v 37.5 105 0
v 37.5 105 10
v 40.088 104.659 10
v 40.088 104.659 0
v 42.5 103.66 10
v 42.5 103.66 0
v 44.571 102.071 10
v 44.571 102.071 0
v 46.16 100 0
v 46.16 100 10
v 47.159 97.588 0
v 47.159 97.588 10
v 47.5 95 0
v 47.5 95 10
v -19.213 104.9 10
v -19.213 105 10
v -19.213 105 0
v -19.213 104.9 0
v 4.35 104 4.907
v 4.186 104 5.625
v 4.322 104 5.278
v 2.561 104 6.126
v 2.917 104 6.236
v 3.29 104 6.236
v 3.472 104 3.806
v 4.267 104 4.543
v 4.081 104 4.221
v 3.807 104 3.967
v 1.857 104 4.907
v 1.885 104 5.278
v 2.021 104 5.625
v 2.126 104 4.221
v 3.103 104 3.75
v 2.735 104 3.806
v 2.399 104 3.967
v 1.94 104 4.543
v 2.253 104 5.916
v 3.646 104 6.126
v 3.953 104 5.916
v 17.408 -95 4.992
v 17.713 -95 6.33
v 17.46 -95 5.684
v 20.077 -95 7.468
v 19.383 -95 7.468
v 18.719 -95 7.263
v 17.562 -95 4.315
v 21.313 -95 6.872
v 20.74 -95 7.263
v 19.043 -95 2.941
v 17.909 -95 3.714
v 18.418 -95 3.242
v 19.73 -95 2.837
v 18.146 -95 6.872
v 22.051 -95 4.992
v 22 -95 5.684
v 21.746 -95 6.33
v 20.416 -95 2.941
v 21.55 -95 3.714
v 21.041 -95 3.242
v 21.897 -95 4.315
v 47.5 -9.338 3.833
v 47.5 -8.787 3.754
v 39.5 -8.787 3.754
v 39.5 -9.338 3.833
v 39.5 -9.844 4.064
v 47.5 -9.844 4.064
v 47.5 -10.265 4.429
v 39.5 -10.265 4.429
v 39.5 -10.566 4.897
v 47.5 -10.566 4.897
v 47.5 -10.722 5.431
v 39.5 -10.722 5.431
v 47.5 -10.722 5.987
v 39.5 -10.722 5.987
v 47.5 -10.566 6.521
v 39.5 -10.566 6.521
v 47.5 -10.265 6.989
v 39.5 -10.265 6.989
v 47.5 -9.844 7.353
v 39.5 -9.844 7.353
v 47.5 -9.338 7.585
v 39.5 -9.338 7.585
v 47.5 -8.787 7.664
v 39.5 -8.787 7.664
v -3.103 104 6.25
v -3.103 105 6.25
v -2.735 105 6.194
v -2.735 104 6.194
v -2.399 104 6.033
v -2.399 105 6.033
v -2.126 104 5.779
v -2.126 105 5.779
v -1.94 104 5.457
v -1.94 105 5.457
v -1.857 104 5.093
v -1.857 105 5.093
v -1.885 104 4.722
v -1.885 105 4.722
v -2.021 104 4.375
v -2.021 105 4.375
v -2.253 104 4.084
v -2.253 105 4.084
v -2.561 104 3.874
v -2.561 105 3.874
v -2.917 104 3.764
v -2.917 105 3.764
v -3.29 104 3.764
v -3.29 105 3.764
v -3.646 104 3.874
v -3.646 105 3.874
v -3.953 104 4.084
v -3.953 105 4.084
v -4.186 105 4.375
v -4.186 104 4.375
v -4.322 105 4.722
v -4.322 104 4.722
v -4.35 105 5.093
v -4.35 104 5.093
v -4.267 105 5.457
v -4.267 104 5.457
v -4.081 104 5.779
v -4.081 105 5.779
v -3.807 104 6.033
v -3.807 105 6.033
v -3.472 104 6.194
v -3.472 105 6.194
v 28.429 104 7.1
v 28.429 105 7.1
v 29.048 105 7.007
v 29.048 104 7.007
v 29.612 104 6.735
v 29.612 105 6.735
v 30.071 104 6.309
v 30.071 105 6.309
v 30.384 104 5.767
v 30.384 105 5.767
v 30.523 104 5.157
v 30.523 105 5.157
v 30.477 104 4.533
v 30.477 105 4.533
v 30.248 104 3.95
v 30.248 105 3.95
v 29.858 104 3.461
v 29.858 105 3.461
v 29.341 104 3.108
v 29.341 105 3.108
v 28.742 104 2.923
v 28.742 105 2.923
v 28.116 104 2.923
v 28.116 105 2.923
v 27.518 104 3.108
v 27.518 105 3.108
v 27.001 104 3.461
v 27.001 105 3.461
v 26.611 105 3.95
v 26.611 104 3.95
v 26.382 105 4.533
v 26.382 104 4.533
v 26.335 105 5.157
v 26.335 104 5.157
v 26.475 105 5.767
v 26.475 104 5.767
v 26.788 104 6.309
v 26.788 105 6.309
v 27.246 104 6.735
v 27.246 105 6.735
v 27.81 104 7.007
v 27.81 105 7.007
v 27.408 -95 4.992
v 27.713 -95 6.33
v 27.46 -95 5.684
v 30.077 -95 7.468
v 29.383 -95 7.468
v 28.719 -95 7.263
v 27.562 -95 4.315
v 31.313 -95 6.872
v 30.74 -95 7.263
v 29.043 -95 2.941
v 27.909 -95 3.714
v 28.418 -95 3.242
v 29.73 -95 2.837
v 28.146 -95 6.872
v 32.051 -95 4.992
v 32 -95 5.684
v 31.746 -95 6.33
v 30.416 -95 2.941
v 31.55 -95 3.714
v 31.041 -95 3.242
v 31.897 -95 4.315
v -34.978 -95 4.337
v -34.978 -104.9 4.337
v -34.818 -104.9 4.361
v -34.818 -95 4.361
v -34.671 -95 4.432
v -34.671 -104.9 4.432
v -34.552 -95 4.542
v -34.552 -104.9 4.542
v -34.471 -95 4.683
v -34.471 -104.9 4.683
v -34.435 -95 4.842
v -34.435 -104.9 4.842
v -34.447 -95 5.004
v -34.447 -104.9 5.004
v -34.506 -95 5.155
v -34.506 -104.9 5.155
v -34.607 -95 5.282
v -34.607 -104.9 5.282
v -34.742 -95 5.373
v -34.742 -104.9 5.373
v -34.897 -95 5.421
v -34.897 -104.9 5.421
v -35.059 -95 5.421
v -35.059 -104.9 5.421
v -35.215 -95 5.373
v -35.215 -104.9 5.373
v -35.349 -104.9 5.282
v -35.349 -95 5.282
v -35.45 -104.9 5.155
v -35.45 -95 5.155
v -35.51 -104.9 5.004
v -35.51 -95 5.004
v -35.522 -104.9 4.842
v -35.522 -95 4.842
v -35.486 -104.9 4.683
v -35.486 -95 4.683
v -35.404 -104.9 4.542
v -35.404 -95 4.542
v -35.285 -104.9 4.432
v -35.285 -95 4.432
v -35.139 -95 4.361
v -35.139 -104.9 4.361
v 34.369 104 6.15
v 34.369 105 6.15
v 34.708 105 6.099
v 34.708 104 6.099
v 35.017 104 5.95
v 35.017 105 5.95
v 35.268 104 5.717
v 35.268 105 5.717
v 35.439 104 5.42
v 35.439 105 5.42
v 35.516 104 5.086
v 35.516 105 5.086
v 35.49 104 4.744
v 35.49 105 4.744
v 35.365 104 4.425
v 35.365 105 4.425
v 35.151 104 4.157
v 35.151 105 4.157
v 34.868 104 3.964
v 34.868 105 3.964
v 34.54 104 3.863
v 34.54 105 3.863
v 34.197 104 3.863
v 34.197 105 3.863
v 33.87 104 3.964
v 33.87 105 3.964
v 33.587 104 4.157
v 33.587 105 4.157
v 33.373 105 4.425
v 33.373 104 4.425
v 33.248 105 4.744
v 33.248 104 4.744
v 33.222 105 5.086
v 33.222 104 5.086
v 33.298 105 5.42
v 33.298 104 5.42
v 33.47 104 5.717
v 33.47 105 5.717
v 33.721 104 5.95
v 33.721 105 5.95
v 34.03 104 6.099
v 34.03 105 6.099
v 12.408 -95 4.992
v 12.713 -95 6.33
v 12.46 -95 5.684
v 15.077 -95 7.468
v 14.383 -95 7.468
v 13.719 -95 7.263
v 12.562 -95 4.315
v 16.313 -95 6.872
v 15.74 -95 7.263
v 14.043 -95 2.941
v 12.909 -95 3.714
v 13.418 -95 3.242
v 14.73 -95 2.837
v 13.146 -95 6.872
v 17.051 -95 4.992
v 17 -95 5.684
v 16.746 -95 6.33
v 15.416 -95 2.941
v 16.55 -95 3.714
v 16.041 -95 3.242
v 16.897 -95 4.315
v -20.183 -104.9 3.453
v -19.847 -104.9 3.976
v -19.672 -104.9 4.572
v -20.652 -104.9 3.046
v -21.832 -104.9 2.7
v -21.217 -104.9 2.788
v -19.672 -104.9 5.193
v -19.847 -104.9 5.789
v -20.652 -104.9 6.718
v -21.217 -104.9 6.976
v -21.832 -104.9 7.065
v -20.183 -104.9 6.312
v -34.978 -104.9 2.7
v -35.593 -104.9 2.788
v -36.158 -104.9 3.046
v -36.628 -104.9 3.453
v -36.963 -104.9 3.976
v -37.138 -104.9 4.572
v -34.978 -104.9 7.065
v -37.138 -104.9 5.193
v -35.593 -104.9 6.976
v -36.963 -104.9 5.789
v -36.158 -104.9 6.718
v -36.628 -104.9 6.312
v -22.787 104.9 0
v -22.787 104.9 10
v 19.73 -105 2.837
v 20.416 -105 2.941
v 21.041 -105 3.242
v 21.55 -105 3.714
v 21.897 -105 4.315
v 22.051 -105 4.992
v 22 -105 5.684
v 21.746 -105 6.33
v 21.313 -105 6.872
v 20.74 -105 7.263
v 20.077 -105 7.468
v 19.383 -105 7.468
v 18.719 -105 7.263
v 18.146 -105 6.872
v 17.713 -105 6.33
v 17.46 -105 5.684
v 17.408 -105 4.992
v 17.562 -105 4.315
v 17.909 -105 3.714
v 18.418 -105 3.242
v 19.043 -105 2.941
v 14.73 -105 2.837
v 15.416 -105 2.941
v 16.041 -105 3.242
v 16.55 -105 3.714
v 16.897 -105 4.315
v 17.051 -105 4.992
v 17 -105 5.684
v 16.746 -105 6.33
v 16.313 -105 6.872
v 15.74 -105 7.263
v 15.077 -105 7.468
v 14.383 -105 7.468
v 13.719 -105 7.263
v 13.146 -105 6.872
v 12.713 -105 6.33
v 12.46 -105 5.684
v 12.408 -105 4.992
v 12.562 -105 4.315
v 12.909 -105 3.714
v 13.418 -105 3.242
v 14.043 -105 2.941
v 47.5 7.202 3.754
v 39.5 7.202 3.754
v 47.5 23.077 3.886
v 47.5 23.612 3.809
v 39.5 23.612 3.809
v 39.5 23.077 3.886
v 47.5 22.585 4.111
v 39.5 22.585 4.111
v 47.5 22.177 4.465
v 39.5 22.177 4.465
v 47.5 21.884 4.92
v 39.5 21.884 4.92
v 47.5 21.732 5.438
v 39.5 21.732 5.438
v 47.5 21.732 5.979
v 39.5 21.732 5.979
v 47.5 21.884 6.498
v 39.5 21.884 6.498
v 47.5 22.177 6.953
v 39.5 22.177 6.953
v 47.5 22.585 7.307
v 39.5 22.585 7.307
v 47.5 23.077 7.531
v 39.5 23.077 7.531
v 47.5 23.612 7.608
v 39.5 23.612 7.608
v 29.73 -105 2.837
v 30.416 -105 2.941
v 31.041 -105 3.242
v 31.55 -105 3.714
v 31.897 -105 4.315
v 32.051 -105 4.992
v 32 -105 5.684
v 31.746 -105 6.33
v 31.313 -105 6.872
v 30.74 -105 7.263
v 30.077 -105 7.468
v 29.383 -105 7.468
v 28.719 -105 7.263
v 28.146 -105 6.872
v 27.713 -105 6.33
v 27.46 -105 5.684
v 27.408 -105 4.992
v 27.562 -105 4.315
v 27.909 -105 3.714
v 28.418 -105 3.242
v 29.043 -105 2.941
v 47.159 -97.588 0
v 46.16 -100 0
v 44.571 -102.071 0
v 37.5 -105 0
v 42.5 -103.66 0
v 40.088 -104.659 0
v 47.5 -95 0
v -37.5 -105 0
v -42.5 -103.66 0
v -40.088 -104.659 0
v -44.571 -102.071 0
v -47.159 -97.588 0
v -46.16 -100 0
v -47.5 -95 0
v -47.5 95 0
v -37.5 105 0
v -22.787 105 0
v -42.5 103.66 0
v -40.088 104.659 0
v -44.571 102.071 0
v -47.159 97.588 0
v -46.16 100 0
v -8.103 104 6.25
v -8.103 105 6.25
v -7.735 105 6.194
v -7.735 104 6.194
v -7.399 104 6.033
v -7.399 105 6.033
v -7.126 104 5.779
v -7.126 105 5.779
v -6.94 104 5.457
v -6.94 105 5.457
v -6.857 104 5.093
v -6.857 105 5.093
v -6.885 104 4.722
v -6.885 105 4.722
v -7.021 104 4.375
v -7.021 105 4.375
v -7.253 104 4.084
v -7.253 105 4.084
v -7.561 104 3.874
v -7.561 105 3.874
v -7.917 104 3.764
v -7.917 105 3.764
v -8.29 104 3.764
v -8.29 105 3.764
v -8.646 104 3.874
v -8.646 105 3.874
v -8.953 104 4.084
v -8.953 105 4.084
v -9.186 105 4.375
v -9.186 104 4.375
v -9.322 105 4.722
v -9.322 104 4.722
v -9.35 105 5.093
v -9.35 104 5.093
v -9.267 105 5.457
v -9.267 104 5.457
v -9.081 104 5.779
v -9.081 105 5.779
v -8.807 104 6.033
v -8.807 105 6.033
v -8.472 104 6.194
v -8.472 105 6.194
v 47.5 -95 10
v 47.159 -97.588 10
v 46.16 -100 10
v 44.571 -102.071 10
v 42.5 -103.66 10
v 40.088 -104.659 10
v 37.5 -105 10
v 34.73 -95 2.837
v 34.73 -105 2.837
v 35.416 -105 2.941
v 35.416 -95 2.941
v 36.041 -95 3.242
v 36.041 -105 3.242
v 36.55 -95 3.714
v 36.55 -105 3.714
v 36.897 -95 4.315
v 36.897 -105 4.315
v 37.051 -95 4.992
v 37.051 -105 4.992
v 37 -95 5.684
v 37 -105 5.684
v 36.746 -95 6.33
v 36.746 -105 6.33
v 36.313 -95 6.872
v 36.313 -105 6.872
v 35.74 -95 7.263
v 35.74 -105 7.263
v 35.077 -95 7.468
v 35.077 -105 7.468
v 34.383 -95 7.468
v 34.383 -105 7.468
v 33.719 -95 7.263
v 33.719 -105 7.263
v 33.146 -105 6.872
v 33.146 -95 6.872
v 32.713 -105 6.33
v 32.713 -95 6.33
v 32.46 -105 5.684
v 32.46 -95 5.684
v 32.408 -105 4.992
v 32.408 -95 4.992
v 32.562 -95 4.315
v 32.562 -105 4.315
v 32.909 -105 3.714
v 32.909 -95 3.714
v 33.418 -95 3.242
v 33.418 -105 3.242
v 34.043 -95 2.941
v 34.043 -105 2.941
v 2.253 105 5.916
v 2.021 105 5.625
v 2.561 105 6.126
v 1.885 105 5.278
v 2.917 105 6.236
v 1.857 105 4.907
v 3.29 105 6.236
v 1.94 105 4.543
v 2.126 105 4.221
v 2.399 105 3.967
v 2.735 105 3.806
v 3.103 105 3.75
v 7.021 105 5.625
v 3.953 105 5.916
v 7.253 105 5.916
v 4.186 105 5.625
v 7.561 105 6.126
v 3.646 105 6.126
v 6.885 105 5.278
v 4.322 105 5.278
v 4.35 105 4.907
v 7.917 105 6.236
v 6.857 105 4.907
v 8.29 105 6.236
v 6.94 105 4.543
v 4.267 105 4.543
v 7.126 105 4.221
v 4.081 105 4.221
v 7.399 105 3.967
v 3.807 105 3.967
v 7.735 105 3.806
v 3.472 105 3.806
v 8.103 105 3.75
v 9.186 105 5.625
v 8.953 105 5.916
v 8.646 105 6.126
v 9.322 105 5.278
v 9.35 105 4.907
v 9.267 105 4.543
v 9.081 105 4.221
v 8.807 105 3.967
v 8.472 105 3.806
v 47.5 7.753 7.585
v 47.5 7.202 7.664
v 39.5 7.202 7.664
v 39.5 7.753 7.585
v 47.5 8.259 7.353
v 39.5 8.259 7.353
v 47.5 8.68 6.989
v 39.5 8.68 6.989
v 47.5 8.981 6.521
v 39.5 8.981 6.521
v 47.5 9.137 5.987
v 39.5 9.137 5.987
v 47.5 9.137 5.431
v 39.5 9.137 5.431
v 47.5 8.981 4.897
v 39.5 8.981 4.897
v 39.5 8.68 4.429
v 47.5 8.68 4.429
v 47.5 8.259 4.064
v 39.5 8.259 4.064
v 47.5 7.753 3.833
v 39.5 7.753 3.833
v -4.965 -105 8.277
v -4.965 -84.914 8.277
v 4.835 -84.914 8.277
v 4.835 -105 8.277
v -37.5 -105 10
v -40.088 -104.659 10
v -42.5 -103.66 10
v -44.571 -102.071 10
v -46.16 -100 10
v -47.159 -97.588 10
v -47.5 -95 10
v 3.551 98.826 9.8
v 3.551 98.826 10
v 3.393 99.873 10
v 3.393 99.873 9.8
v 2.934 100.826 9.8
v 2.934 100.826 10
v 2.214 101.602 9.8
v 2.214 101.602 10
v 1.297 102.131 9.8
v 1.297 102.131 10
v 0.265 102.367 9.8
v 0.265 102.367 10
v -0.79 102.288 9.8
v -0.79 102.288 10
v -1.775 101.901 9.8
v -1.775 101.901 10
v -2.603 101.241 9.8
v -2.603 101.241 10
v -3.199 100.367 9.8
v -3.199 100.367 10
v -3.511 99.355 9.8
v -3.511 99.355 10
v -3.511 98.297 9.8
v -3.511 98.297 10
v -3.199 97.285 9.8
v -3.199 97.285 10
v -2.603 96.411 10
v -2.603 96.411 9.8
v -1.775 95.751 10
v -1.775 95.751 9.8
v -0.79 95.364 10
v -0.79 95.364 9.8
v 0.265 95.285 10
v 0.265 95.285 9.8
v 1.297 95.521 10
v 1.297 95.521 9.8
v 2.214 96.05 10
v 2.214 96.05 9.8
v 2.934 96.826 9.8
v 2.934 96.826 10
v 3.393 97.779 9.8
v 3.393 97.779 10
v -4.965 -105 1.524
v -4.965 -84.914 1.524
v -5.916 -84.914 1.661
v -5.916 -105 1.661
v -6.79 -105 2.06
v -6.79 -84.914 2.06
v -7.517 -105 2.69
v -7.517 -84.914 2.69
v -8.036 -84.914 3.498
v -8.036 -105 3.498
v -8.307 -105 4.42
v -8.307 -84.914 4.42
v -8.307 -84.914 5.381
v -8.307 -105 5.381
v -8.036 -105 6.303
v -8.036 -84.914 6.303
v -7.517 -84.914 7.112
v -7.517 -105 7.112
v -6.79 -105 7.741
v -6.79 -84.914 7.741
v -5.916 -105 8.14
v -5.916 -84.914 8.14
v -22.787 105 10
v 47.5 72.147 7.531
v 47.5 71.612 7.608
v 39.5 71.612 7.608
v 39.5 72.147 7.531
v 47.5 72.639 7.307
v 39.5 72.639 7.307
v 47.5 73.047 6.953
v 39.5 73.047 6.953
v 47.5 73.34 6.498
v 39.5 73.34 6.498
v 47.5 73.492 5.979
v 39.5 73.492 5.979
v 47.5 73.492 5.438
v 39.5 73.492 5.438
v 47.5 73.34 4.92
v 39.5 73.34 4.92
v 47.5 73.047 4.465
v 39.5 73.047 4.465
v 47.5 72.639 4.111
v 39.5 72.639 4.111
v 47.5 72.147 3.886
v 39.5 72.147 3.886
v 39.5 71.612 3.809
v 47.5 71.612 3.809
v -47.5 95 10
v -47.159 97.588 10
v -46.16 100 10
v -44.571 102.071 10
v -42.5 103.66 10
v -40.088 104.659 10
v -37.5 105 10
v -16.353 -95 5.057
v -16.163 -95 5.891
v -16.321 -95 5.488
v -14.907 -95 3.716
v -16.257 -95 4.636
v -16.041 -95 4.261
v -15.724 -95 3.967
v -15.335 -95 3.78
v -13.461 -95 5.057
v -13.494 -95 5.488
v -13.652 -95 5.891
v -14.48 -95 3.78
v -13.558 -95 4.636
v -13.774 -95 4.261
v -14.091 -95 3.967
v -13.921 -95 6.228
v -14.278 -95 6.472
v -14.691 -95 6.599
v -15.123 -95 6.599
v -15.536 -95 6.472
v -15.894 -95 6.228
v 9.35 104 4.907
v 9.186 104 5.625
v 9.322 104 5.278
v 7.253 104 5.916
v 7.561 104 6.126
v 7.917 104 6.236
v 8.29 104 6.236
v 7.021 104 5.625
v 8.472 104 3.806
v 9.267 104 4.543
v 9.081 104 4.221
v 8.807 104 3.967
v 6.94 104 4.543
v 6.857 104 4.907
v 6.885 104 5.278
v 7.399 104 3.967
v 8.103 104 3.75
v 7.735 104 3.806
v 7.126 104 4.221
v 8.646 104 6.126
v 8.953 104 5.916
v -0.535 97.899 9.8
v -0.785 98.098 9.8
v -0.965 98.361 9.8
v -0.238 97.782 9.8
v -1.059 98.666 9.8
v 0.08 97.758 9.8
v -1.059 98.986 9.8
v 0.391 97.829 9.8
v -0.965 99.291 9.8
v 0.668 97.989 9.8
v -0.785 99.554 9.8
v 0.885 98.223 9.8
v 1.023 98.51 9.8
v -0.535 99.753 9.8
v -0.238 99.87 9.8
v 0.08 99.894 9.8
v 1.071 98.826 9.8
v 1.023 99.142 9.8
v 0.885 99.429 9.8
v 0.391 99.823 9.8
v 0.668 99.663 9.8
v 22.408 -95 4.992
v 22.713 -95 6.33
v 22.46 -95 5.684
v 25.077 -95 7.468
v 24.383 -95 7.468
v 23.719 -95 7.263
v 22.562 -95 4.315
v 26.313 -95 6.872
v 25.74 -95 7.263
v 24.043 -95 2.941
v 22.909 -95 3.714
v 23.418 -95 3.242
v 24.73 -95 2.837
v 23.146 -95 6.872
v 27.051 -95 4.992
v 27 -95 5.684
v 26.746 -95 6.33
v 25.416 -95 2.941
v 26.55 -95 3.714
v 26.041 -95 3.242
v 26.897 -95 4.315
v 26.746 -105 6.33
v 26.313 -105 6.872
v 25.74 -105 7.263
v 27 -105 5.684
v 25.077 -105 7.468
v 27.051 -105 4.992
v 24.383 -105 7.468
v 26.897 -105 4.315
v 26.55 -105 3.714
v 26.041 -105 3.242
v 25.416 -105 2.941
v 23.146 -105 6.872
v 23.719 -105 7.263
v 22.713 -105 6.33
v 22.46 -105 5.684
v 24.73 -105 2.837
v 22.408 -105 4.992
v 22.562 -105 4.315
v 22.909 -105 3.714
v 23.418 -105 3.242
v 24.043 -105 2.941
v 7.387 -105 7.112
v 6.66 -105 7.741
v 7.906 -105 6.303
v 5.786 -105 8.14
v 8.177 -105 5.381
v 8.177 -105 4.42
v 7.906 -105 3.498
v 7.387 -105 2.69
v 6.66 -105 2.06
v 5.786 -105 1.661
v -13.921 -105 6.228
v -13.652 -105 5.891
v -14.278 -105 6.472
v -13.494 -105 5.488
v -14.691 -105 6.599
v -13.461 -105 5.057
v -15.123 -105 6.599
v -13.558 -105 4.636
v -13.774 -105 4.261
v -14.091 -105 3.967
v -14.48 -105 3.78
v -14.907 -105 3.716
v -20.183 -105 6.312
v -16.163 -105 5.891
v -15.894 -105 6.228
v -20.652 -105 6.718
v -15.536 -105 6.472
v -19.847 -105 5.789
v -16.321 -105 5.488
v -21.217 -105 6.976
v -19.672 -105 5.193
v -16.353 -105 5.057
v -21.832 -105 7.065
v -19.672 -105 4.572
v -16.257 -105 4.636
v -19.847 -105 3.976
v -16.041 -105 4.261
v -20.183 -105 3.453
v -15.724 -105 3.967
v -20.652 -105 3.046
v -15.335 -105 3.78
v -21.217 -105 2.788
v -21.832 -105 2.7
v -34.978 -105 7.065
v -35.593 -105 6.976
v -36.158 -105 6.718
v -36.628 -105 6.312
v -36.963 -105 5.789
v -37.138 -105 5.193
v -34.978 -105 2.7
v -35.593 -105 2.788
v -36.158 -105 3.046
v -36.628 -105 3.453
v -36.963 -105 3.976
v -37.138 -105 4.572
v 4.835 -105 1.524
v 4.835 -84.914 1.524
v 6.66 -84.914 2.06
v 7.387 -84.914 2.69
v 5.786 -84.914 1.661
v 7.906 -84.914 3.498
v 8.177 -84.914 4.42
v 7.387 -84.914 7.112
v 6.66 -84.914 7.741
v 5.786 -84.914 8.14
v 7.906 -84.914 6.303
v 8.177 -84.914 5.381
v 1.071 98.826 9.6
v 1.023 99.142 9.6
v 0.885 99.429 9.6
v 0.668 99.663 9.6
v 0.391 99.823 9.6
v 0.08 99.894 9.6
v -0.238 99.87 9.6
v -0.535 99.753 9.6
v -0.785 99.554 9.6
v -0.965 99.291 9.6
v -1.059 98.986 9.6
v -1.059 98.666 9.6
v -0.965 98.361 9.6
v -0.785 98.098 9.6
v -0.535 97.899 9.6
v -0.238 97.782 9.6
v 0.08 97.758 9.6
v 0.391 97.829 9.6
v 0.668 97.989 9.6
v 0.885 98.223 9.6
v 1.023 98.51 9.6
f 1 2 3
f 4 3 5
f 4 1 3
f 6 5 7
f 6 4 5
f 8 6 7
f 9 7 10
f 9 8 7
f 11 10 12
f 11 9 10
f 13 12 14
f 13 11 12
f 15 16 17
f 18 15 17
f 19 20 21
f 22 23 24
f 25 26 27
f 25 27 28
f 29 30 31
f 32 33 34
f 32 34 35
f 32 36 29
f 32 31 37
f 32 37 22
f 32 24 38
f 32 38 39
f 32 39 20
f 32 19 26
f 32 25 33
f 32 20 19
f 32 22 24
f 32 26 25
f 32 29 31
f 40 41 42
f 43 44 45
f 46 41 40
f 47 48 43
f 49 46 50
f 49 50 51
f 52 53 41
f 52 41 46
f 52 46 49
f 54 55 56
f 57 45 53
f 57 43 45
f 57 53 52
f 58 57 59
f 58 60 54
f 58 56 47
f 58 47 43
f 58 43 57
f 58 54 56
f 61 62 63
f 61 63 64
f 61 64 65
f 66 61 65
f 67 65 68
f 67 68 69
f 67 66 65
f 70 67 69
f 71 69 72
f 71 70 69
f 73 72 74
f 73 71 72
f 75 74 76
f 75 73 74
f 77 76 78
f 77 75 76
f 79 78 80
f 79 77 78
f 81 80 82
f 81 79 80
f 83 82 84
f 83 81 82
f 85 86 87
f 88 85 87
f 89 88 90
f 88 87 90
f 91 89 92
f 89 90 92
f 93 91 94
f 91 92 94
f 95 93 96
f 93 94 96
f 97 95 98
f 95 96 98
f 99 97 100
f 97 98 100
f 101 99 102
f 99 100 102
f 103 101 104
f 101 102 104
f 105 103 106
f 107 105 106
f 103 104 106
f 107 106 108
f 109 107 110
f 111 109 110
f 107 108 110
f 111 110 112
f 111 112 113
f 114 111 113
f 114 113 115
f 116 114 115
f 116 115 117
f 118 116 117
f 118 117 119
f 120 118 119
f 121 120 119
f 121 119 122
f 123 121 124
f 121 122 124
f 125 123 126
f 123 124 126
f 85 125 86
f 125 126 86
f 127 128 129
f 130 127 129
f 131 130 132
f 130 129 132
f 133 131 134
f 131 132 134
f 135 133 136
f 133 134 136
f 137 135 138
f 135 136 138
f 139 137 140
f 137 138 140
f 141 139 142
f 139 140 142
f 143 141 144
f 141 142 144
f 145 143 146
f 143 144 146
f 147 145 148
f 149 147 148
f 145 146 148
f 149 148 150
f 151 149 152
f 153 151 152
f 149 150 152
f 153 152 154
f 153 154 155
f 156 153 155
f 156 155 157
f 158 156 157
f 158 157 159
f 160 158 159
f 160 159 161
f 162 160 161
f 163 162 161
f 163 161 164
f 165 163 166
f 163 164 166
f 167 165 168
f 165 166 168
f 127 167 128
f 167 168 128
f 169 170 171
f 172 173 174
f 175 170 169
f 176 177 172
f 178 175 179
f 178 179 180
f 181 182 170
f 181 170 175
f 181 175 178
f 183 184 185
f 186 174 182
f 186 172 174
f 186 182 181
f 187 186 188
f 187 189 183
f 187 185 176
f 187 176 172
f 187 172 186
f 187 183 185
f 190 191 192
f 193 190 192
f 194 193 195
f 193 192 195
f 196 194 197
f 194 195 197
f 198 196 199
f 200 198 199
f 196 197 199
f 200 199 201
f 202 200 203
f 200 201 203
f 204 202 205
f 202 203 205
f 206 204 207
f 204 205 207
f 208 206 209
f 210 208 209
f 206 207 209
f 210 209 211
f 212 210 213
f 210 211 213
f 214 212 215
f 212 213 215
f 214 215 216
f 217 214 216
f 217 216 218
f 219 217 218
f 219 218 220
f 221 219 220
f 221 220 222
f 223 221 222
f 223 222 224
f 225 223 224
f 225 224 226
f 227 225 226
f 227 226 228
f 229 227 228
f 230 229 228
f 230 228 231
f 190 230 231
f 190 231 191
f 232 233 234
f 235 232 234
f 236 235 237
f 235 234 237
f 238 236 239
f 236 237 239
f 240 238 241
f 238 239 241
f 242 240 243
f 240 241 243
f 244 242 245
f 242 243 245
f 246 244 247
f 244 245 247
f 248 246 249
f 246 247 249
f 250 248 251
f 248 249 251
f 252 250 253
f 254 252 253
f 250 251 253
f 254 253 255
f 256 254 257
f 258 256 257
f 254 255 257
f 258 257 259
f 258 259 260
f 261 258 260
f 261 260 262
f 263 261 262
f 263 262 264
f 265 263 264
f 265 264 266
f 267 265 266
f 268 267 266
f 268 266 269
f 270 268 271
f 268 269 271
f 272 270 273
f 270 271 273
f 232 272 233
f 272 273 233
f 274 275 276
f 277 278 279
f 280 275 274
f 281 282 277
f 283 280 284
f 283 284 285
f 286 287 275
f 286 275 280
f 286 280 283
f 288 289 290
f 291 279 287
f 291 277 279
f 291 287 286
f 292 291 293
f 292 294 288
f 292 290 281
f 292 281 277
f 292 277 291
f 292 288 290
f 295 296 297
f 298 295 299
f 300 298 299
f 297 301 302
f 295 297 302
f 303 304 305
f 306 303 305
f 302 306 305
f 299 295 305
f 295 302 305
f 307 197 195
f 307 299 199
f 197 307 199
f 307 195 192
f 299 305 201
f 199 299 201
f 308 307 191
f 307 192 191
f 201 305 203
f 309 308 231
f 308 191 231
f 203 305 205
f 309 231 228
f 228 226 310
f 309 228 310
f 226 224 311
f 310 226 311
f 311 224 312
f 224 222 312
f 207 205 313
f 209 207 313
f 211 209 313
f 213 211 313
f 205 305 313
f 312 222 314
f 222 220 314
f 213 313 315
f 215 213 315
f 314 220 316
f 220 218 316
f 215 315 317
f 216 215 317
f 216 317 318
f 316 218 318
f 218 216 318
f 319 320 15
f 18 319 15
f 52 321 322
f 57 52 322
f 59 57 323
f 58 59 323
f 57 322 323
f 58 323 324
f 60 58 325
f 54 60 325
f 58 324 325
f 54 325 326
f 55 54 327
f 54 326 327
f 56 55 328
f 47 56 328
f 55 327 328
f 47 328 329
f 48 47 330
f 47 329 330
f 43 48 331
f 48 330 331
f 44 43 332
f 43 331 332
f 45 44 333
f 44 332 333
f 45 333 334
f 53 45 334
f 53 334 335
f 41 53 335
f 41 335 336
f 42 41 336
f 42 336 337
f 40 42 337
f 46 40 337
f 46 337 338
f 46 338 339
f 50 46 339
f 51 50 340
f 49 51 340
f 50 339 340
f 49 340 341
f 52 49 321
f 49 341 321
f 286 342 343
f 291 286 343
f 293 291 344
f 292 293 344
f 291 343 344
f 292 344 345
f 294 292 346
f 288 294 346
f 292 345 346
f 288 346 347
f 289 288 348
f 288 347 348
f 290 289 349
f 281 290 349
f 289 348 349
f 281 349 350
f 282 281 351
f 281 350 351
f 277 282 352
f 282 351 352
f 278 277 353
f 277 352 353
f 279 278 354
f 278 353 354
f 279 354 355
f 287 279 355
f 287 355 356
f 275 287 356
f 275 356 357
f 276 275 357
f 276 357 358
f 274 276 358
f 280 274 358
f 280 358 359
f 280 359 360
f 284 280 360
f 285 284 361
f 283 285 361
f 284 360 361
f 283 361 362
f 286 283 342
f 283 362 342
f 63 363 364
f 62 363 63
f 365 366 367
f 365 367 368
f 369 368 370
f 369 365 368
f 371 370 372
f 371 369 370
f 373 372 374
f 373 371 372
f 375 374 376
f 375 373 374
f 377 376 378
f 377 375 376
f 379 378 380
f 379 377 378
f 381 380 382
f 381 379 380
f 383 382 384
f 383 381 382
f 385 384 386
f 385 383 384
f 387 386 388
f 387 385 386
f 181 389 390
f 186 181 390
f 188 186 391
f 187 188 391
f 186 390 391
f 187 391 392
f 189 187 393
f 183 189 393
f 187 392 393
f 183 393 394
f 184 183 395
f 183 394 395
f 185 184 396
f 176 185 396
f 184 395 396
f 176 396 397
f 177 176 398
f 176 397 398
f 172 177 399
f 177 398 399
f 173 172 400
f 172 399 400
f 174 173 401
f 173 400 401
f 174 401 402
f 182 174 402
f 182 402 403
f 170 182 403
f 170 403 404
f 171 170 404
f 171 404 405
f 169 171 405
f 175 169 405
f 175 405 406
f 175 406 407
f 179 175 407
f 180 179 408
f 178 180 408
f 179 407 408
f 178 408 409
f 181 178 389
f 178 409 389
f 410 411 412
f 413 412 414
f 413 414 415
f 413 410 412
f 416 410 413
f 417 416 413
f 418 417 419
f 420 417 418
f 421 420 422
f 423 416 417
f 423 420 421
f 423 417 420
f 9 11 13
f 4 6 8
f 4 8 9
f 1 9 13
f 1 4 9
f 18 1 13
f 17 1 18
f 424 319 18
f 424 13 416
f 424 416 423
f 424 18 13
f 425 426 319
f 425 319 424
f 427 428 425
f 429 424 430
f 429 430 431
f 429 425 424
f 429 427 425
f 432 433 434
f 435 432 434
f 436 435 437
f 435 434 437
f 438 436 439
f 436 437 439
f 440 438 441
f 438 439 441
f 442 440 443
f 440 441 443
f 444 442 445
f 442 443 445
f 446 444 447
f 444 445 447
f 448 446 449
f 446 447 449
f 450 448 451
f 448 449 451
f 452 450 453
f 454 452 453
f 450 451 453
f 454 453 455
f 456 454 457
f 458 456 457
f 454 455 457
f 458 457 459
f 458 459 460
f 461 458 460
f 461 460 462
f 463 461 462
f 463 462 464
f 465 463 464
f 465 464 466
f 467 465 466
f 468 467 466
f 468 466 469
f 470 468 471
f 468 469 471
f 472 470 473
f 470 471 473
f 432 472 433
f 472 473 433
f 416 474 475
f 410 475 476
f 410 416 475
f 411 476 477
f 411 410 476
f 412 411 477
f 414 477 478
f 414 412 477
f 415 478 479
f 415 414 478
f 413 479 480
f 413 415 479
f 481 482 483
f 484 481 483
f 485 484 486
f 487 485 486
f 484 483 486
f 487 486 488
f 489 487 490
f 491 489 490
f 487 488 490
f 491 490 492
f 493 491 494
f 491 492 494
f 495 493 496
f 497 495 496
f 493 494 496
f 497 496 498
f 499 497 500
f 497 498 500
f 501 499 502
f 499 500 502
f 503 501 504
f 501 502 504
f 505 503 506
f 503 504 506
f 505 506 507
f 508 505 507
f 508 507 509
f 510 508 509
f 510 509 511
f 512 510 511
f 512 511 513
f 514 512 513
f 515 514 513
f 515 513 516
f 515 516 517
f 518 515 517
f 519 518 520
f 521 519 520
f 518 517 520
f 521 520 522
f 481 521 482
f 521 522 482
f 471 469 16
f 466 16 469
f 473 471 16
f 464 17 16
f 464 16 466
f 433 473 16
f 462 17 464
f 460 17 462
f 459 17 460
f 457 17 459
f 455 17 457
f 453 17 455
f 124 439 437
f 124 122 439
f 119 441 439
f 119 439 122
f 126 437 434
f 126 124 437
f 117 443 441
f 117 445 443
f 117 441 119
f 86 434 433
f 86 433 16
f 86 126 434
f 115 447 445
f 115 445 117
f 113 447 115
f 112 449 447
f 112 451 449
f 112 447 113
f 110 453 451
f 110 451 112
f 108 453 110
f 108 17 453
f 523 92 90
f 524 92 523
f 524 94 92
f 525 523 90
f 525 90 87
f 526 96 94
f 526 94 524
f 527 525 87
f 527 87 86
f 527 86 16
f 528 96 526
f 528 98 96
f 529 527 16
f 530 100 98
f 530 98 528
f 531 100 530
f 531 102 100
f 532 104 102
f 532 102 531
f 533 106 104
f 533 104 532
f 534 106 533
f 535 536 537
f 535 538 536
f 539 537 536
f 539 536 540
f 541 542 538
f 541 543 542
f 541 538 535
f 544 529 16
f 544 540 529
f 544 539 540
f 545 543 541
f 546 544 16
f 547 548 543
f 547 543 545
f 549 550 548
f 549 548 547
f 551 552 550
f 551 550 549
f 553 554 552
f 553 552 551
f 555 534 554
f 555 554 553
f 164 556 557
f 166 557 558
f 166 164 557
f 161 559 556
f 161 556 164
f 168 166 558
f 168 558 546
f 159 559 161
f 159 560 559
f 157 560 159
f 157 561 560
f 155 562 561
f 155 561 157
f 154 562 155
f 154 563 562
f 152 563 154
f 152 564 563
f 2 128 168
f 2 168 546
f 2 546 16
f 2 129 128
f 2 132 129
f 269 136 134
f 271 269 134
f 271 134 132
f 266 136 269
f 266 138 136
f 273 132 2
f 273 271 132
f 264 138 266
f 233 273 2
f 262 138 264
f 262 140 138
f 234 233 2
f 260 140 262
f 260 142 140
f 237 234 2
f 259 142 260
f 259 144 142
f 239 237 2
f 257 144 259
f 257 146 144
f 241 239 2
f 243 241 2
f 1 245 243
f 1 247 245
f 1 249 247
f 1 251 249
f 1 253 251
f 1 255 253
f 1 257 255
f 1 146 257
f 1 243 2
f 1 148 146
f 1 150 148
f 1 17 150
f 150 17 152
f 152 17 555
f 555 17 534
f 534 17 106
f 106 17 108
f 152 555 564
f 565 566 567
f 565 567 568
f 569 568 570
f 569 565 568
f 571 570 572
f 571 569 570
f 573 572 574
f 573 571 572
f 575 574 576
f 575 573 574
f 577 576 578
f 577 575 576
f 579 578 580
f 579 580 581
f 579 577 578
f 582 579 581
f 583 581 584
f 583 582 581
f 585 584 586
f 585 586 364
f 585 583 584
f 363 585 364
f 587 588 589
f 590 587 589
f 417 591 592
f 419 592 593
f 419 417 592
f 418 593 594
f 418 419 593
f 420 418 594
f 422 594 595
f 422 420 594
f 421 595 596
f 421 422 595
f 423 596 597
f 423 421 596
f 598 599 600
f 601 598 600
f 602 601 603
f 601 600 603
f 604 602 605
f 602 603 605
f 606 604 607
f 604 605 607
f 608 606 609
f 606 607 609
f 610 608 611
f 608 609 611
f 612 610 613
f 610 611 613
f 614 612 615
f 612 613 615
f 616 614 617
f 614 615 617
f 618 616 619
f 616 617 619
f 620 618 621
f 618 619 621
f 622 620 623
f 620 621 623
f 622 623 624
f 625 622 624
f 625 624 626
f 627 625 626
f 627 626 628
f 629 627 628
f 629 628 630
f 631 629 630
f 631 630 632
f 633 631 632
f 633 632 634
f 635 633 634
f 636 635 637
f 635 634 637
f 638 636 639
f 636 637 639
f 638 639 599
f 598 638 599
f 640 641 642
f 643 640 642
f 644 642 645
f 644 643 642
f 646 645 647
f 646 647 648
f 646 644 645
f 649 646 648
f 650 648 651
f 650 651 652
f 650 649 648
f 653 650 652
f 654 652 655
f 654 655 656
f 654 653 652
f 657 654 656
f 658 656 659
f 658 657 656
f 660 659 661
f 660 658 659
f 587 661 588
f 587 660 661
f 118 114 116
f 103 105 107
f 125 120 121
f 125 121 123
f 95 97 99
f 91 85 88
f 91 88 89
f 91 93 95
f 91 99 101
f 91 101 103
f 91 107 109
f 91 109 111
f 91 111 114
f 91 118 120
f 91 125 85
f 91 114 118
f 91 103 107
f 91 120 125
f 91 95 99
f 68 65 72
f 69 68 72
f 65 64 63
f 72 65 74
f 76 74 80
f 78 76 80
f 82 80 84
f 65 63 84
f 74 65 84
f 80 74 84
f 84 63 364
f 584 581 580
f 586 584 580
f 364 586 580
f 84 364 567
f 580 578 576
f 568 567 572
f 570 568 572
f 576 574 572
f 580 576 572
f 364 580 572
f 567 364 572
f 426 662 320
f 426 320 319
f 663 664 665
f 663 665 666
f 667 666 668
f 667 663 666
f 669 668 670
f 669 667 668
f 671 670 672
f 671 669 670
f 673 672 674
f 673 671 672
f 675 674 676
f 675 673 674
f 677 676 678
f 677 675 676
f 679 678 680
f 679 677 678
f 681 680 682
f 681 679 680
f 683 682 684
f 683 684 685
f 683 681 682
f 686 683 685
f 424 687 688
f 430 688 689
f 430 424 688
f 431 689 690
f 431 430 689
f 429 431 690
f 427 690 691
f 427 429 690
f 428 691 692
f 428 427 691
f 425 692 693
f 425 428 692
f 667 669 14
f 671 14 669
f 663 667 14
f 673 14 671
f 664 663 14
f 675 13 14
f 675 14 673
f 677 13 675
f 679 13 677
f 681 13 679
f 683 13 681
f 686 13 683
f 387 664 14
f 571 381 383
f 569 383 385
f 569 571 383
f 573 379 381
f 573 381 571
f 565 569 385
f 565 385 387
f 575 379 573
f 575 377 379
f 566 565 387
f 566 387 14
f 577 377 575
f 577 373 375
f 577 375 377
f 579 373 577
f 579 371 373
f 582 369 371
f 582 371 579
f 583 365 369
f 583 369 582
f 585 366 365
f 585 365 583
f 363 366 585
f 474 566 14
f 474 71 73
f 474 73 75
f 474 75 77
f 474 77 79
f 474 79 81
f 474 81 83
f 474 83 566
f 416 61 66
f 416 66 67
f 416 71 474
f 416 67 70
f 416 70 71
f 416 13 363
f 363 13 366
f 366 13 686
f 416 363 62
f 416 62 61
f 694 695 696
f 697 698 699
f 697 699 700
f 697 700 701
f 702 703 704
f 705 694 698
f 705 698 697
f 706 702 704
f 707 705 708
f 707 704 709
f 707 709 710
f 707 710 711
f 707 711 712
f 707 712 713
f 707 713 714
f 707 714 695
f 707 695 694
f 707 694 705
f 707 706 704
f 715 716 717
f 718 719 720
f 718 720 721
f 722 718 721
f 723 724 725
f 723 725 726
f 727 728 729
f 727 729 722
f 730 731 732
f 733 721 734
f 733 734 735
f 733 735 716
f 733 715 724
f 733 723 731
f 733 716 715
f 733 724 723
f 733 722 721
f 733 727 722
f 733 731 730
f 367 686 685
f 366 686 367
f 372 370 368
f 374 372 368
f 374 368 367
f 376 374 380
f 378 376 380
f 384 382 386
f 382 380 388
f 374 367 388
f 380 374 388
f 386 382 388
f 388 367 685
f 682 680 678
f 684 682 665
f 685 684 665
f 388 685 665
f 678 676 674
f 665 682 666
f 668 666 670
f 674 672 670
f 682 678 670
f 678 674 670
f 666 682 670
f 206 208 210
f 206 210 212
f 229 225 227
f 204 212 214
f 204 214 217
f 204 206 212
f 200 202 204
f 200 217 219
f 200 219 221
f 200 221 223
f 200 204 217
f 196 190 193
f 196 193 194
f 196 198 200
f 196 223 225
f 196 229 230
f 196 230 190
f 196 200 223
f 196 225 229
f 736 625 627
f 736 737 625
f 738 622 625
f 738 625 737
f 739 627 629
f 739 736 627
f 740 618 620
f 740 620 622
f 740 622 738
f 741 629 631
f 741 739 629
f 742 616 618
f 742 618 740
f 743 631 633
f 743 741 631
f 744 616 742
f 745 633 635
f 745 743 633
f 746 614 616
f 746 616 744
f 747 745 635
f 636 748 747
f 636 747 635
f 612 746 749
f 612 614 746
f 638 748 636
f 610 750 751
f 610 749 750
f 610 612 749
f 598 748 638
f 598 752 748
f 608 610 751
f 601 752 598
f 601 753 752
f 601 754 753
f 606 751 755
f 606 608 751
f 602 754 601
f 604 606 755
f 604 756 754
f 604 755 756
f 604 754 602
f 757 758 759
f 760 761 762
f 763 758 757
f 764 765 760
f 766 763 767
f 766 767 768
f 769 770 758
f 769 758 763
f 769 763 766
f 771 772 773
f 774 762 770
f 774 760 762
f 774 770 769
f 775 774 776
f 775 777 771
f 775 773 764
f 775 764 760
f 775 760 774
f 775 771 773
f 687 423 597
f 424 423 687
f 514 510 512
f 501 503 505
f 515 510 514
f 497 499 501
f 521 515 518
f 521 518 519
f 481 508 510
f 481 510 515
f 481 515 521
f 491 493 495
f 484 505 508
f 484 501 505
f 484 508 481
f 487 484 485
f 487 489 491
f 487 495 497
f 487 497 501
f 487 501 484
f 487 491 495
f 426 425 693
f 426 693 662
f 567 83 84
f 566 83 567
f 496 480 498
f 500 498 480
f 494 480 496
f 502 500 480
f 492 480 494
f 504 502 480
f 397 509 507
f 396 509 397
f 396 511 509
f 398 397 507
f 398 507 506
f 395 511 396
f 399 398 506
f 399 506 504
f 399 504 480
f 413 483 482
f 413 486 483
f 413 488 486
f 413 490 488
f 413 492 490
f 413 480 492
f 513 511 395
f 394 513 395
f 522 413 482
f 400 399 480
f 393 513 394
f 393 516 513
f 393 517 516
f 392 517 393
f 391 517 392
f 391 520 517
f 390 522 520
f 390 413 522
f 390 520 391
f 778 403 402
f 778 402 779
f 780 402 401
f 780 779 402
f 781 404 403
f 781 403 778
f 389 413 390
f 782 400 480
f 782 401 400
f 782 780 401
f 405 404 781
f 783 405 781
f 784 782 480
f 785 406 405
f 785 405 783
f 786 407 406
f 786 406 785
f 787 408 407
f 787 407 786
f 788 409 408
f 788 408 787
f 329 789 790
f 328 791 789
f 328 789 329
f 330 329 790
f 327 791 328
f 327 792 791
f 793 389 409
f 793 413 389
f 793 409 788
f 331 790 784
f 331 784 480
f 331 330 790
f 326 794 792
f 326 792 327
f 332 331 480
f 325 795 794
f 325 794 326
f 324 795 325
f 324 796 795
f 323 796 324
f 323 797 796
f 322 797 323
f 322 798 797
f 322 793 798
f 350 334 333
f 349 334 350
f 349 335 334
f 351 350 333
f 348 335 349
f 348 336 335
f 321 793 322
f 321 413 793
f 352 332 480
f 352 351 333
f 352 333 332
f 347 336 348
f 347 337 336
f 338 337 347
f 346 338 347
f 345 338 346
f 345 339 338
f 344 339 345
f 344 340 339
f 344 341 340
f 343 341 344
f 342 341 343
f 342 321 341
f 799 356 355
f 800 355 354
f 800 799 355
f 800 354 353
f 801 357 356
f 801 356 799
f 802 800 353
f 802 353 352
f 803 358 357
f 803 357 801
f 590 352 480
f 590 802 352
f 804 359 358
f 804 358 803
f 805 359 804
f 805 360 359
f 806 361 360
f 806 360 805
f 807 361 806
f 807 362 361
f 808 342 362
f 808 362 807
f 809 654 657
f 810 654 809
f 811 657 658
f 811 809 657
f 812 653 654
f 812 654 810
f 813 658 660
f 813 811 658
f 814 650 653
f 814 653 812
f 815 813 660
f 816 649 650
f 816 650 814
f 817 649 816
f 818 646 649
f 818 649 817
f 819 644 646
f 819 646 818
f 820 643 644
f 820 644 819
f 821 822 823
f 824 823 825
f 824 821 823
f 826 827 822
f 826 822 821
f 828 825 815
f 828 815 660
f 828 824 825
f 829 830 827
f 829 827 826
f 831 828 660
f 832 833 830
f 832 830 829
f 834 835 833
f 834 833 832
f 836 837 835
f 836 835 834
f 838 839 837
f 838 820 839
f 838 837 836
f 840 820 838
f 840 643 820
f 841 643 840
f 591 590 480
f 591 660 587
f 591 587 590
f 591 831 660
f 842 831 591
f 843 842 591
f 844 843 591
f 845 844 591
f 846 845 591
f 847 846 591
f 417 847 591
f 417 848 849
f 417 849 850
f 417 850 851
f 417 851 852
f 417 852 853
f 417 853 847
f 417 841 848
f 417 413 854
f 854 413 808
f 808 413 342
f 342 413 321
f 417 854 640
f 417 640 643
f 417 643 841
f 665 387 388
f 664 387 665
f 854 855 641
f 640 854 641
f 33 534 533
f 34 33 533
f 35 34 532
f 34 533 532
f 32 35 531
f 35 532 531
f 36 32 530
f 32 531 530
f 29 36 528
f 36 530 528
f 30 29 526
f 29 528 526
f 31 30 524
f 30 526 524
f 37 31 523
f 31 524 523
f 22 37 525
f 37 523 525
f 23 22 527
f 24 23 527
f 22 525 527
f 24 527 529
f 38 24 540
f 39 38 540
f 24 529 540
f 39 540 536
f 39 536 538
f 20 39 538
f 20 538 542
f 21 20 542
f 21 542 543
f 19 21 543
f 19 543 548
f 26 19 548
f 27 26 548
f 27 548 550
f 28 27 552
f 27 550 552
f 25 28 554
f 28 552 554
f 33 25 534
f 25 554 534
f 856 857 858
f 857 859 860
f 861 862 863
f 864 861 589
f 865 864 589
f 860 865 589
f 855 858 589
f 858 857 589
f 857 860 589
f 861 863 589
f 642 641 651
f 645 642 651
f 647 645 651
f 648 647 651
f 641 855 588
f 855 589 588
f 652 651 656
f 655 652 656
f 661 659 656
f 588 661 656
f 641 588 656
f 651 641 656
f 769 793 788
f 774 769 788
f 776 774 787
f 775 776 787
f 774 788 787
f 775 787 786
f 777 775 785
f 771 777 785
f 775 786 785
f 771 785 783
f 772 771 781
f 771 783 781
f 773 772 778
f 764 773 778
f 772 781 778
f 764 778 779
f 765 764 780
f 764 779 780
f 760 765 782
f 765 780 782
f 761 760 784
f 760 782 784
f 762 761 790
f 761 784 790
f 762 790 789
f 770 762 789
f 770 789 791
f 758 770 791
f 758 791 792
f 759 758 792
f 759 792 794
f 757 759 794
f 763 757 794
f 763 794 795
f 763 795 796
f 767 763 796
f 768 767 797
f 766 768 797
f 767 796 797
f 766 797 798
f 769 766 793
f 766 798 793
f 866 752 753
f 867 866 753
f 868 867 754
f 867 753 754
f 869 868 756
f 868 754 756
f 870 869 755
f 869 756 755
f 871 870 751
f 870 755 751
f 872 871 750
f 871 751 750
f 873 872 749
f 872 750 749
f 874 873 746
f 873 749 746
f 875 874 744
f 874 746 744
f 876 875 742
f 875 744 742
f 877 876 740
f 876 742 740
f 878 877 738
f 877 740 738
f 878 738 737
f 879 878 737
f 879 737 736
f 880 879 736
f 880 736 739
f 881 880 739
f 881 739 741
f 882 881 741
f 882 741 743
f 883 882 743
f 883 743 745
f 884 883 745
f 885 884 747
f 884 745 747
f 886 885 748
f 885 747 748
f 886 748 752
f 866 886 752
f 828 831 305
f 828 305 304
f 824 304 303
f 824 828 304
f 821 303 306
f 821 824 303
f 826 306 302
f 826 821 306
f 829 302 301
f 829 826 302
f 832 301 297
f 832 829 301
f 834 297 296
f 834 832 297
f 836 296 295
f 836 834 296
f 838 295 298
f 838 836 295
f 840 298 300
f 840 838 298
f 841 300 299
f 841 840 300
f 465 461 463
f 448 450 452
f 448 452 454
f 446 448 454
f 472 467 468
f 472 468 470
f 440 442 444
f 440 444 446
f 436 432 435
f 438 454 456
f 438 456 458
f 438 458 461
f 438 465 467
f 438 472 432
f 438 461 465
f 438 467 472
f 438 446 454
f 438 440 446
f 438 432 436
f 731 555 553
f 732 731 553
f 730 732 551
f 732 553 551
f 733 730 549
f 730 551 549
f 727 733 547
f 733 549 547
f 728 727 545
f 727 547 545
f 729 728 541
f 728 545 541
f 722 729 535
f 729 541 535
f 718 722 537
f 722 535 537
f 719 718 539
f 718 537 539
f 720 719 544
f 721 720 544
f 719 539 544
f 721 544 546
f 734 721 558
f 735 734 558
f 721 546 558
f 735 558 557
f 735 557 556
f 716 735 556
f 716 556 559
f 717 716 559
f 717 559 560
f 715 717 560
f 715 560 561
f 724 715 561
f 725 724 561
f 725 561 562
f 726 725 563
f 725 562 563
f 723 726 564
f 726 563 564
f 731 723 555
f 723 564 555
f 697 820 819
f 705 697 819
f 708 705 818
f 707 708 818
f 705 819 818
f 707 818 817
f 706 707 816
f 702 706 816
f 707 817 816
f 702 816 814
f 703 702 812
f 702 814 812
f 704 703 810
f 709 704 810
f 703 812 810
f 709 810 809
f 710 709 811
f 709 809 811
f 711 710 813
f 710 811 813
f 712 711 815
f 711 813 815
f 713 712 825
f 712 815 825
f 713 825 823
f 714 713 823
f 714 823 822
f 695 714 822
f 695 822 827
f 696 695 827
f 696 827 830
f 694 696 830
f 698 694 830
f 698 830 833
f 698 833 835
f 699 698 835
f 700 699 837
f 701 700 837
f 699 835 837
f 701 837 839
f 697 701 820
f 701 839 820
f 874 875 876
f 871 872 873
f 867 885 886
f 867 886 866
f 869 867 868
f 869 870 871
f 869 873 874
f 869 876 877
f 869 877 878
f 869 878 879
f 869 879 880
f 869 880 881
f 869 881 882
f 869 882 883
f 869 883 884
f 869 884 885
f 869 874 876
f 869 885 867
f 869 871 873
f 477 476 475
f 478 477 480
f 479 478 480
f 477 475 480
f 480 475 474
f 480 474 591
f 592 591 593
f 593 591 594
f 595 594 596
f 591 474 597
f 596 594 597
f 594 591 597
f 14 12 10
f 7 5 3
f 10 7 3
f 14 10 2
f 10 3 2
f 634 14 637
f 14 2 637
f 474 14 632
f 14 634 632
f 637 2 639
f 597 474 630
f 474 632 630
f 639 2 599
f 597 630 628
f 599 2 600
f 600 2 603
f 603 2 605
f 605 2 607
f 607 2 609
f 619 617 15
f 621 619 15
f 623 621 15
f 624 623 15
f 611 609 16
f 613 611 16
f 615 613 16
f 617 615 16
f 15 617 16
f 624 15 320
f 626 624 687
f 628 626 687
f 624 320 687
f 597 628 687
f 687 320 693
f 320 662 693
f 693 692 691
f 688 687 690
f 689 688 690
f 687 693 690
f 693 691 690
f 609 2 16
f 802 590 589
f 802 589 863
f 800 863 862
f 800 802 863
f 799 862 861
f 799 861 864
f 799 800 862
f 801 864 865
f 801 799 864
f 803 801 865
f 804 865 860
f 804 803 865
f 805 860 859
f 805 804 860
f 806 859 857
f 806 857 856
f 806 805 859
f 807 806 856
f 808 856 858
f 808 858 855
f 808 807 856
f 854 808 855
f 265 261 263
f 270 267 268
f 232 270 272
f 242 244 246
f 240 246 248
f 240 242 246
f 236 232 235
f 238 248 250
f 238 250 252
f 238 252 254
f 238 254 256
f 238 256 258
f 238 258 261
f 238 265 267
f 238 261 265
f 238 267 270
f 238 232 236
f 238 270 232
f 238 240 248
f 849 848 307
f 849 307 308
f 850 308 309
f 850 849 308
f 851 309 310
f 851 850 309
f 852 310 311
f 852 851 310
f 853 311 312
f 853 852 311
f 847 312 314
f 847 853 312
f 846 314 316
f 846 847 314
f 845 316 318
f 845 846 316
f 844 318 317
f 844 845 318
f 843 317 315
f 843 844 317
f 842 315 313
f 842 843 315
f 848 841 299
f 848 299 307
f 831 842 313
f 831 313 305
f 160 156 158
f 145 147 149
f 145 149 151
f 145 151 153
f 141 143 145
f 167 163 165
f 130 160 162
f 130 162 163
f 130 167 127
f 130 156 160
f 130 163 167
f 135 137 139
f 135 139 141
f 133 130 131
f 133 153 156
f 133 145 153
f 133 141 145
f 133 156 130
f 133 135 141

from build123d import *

# Parameters (mm, degrees)
EXTRUDE_2_DEPTH      = 10
SKETCH_10_R          = 1.25
SKETCH_10_R_2        = 2.1
SKETCH_10_R_3        = 1.15
CUT_EXTRUDE_3_DEPTH  = 1
CUT_EXTRUDE_4_DEPTH  = 20.085810478
SKETCH_16_R          = 1.45
SKETCH_16_R_2        = 2.328282895
CUT_EXTRUDE_6_DEPTH  = 10
SKETCH_18_R          = 0.54507581
CUT_EXTRUDE_7_DEPTH  = 10
CUT_EXTRUDE_8_DEPTH  = 8
SKETCH_22_R          = 3.550641332
CUT_EXTRUDE_9_DEPTH  = 0.2
SKETCH_23_R          = 1.070824202
CUT_EXTRUDE_10_DEPTH = 0.2
CUT_EXTRUDE_11_DEPTH = 0.1
SKETCH_8_W           = 3.574817698
SKETCH_8_H           = 10
CUT_EXTRUDE_13_DEPTH = 0.1


with BuildPart() as part:
    # 草图1 → 凸台-拉伸2 (new body)
    with BuildSketch(Plane.XY):
        with BuildLine():
            Line((-37.5, 105), (37.5, 105))
            ThreePointArc((37.5, 105), (44.571067812, 102.071067812), (47.5, 95))
            Line((47.5, 95), (47.5, -95))
            ThreePointArc((47.5, -95), (44.571067812, -102.071067812), (37.5, -105))
            Line((37.5, -105), (-37.5, -105))
            ThreePointArc((-37.5, -105), (-44.571067812, -102.071067812), (-47.5, -95))
            Line((-47.5, -95), (-47.5, 95))
            ThreePointArc((-47.5, 95), (-44.571067812, 102.071067812), (-37.5, 105))
        make_face()
    extrude(amount=EXTRUDE_2_DEPTH)

    # 草图10 → 切除-拉伸3 (cut)
    with BuildSketch(Plane(origin=(0, 105, 0), x_dir=(1, 0, 0), z_dir=(0, 1, 0))):
        with Locations(Location((-3.103218147, -5, 0), (0, 0, 270))):
            Circle(SKETCH_10_R)
        with Locations(Location((-8.103218147, -5, 0), (0, 0, 270))):
            Circle(SKETCH_10_R)
        with Locations(Location((8.103218147, -5, 0), (0, 0, 90))):
            Circle(SKETCH_10_R)
        with Locations(Location((3.103218147, -5, 0), (0, 0, 90))):
            Circle(SKETCH_10_R)
        with Locations(Location((28.429371283, -5, 0), (0, 0, 270))):
            Circle(SKETCH_10_R_2)
        with Locations(Location((34.368889588, -5, 0), (0, 0, 270))):
            Circle(SKETCH_10_R_3)
    extrude(amount=-CUT_EXTRUDE_3_DEPTH, mode=Mode.SUBTRACT)

    # 草图14 → 切除-拉伸4 (cut)
    with BuildSketch(Plane.XZ.offset(105)):
        with BuildLine():
            Line((-4.965024582, 8.276916224), (4.834975418, 8.276916224))
            ThreePointArc((4.834975418, 8.276916224), (8.211192134, 4.900699508), (4.834975418, 1.524482793))
            Line((4.834975418, 1.524482793), (-4.965024582, 1.524482793))
            ThreePointArc((-4.965024582, 1.524482793), (-8.341241297, 4.900699508), (-4.965024582, 8.276916224))
        make_face()
    extrude(amount=-CUT_EXTRUDE_4_DEPTH, mode=Mode.SUBTRACT)

    # 草图16 → 切除-拉伸6 (cut)
    with BuildSketch(Plane.XZ.offset(105)):
        with Locations(Location((-14.907323762, 5.165500819, 0), (0, 0, 270))):
            Circle(SKETCH_16_R)
        with Locations(Location((14.729603626, 5.165500819, 0), (0, 0, 270))):
            Circle(SKETCH_16_R_2)
        with Locations(Location((19.729603626, 5.165500819, 0), (0, 0, 270))):
            Circle(SKETCH_16_R_2)
        with Locations(Location((24.729603626, 5.165500819, 0), (0, 0, 270))):
            Circle(SKETCH_16_R_2)
        with Locations(Location((29.729603626, 5.165500819, 0), (0, 0, 270))):
            Circle(SKETCH_16_R_2)
        with Locations(Location((34.729603626, 5.165500819, 0), (0, 0, 270))):
            Circle(SKETCH_16_R_2)
    extrude(amount=-CUT_EXTRUDE_6_DEPTH, mode=Mode.SUBTRACT)

    # 草图18 → 切除-拉伸7 (cut)
    with BuildSketch(Plane.XZ.offset(105)):
        with Locations(Location((-34.978222052, 4.882313786, 0), (0, 0, 270))):
            Circle(SKETCH_18_R)
    extrude(amount=-CUT_EXTRUDE_7_DEPTH, mode=Mode.SUBTRACT)

    # 草图21 → 切除-拉伸8 (cut)
    with BuildSketch(Plane(origin=(47.5, 0, 0), x_dir=(0, 0, -1), z_dir=(1, 0, 0))):
        with BuildLine():
            Line((-3.80943092, 71.612022187), (-3.80943092, 23.612022187))
            ThreePointArc((-3.80943092, 23.612022187), (-5.70879523, 21.712657877), (-7.60815954, 23.612022187))
            Line((-7.60815954, 23.612022187), (-7.60815954, 71.612022187))
            ThreePointArc((-7.60815954, 71.612022187), (-5.70879523, 73.511386497), (-3.80943092, 71.612022187))
        make_face()
        with BuildLine():
            Line((-3.753848509, 7.202317814), (-3.753848509, -8.787308396))
            ThreePointArc((-3.753848509, -8.787308396), (-5.70879523, -10.742255117), (-7.663741952, -8.787308396))
            Line((-7.663741952, -8.787308396), (-7.663741952, 7.202317814))
            ThreePointArc((-7.663741952, 7.202317814), (-5.70879523, 9.157264535), (-3.753848509, 7.202317814))
        make_face()
    extrude(amount=-CUT_EXTRUDE_8_DEPTH, mode=Mode.SUBTRACT)

    # 草图22 → 切除-拉伸9 (cut)
    with BuildSketch(Plane.XY.offset(10)):
        with Locations((0, 98.825967342)):
            Circle(SKETCH_22_R)
    extrude(amount=-CUT_EXTRUDE_9_DEPTH, mode=Mode.SUBTRACT)

    # 草图23 → 切除-拉伸10 (cut)
    with BuildSketch(Plane.XY.offset(9.8)):
        with Locations((0, 98.825967342)):
            Circle(SKETCH_23_R)
    extrude(amount=-CUT_EXTRUDE_10_DEPTH, mode=Mode.SUBTRACT)

    # 草图19 → 切除-拉伸11 (cut)
    with BuildSketch(Plane.XZ.offset(105)):
        with BuildLine():
            Line((-34.978222052, 7.064787425), (-21.832097418, 7.064787425))
            ThreePointArc((-21.832097418, 7.064787425), (-19.64962378, 4.882313786), (-21.832097418, 2.699840148))
            Line((-21.832097418, 2.699840148), (-34.978222052, 2.699840148))
            ThreePointArc((-34.978222052, 2.699840148), (-37.160695691, 4.882313786), (-34.978222052, 7.064787425))
        make_face()
    extrude(amount=-CUT_EXTRUDE_11_DEPTH, mode=Mode.SUBTRACT)

    # 草图8 → 切除-拉伸13 (cut)
    with BuildSketch(Plane(origin=(0, 105, 0), x_dir=(1, 0, 0), z_dir=(0, 1, 0))):
        with Locations((-21, -5)):
            Rectangle(SKETCH_8_W, SKETCH_8_H)
    extrude(amount=-CUT_EXTRUDE_13_DEPTH, mode=Mode.SUBTRACT)


solid = part.part
